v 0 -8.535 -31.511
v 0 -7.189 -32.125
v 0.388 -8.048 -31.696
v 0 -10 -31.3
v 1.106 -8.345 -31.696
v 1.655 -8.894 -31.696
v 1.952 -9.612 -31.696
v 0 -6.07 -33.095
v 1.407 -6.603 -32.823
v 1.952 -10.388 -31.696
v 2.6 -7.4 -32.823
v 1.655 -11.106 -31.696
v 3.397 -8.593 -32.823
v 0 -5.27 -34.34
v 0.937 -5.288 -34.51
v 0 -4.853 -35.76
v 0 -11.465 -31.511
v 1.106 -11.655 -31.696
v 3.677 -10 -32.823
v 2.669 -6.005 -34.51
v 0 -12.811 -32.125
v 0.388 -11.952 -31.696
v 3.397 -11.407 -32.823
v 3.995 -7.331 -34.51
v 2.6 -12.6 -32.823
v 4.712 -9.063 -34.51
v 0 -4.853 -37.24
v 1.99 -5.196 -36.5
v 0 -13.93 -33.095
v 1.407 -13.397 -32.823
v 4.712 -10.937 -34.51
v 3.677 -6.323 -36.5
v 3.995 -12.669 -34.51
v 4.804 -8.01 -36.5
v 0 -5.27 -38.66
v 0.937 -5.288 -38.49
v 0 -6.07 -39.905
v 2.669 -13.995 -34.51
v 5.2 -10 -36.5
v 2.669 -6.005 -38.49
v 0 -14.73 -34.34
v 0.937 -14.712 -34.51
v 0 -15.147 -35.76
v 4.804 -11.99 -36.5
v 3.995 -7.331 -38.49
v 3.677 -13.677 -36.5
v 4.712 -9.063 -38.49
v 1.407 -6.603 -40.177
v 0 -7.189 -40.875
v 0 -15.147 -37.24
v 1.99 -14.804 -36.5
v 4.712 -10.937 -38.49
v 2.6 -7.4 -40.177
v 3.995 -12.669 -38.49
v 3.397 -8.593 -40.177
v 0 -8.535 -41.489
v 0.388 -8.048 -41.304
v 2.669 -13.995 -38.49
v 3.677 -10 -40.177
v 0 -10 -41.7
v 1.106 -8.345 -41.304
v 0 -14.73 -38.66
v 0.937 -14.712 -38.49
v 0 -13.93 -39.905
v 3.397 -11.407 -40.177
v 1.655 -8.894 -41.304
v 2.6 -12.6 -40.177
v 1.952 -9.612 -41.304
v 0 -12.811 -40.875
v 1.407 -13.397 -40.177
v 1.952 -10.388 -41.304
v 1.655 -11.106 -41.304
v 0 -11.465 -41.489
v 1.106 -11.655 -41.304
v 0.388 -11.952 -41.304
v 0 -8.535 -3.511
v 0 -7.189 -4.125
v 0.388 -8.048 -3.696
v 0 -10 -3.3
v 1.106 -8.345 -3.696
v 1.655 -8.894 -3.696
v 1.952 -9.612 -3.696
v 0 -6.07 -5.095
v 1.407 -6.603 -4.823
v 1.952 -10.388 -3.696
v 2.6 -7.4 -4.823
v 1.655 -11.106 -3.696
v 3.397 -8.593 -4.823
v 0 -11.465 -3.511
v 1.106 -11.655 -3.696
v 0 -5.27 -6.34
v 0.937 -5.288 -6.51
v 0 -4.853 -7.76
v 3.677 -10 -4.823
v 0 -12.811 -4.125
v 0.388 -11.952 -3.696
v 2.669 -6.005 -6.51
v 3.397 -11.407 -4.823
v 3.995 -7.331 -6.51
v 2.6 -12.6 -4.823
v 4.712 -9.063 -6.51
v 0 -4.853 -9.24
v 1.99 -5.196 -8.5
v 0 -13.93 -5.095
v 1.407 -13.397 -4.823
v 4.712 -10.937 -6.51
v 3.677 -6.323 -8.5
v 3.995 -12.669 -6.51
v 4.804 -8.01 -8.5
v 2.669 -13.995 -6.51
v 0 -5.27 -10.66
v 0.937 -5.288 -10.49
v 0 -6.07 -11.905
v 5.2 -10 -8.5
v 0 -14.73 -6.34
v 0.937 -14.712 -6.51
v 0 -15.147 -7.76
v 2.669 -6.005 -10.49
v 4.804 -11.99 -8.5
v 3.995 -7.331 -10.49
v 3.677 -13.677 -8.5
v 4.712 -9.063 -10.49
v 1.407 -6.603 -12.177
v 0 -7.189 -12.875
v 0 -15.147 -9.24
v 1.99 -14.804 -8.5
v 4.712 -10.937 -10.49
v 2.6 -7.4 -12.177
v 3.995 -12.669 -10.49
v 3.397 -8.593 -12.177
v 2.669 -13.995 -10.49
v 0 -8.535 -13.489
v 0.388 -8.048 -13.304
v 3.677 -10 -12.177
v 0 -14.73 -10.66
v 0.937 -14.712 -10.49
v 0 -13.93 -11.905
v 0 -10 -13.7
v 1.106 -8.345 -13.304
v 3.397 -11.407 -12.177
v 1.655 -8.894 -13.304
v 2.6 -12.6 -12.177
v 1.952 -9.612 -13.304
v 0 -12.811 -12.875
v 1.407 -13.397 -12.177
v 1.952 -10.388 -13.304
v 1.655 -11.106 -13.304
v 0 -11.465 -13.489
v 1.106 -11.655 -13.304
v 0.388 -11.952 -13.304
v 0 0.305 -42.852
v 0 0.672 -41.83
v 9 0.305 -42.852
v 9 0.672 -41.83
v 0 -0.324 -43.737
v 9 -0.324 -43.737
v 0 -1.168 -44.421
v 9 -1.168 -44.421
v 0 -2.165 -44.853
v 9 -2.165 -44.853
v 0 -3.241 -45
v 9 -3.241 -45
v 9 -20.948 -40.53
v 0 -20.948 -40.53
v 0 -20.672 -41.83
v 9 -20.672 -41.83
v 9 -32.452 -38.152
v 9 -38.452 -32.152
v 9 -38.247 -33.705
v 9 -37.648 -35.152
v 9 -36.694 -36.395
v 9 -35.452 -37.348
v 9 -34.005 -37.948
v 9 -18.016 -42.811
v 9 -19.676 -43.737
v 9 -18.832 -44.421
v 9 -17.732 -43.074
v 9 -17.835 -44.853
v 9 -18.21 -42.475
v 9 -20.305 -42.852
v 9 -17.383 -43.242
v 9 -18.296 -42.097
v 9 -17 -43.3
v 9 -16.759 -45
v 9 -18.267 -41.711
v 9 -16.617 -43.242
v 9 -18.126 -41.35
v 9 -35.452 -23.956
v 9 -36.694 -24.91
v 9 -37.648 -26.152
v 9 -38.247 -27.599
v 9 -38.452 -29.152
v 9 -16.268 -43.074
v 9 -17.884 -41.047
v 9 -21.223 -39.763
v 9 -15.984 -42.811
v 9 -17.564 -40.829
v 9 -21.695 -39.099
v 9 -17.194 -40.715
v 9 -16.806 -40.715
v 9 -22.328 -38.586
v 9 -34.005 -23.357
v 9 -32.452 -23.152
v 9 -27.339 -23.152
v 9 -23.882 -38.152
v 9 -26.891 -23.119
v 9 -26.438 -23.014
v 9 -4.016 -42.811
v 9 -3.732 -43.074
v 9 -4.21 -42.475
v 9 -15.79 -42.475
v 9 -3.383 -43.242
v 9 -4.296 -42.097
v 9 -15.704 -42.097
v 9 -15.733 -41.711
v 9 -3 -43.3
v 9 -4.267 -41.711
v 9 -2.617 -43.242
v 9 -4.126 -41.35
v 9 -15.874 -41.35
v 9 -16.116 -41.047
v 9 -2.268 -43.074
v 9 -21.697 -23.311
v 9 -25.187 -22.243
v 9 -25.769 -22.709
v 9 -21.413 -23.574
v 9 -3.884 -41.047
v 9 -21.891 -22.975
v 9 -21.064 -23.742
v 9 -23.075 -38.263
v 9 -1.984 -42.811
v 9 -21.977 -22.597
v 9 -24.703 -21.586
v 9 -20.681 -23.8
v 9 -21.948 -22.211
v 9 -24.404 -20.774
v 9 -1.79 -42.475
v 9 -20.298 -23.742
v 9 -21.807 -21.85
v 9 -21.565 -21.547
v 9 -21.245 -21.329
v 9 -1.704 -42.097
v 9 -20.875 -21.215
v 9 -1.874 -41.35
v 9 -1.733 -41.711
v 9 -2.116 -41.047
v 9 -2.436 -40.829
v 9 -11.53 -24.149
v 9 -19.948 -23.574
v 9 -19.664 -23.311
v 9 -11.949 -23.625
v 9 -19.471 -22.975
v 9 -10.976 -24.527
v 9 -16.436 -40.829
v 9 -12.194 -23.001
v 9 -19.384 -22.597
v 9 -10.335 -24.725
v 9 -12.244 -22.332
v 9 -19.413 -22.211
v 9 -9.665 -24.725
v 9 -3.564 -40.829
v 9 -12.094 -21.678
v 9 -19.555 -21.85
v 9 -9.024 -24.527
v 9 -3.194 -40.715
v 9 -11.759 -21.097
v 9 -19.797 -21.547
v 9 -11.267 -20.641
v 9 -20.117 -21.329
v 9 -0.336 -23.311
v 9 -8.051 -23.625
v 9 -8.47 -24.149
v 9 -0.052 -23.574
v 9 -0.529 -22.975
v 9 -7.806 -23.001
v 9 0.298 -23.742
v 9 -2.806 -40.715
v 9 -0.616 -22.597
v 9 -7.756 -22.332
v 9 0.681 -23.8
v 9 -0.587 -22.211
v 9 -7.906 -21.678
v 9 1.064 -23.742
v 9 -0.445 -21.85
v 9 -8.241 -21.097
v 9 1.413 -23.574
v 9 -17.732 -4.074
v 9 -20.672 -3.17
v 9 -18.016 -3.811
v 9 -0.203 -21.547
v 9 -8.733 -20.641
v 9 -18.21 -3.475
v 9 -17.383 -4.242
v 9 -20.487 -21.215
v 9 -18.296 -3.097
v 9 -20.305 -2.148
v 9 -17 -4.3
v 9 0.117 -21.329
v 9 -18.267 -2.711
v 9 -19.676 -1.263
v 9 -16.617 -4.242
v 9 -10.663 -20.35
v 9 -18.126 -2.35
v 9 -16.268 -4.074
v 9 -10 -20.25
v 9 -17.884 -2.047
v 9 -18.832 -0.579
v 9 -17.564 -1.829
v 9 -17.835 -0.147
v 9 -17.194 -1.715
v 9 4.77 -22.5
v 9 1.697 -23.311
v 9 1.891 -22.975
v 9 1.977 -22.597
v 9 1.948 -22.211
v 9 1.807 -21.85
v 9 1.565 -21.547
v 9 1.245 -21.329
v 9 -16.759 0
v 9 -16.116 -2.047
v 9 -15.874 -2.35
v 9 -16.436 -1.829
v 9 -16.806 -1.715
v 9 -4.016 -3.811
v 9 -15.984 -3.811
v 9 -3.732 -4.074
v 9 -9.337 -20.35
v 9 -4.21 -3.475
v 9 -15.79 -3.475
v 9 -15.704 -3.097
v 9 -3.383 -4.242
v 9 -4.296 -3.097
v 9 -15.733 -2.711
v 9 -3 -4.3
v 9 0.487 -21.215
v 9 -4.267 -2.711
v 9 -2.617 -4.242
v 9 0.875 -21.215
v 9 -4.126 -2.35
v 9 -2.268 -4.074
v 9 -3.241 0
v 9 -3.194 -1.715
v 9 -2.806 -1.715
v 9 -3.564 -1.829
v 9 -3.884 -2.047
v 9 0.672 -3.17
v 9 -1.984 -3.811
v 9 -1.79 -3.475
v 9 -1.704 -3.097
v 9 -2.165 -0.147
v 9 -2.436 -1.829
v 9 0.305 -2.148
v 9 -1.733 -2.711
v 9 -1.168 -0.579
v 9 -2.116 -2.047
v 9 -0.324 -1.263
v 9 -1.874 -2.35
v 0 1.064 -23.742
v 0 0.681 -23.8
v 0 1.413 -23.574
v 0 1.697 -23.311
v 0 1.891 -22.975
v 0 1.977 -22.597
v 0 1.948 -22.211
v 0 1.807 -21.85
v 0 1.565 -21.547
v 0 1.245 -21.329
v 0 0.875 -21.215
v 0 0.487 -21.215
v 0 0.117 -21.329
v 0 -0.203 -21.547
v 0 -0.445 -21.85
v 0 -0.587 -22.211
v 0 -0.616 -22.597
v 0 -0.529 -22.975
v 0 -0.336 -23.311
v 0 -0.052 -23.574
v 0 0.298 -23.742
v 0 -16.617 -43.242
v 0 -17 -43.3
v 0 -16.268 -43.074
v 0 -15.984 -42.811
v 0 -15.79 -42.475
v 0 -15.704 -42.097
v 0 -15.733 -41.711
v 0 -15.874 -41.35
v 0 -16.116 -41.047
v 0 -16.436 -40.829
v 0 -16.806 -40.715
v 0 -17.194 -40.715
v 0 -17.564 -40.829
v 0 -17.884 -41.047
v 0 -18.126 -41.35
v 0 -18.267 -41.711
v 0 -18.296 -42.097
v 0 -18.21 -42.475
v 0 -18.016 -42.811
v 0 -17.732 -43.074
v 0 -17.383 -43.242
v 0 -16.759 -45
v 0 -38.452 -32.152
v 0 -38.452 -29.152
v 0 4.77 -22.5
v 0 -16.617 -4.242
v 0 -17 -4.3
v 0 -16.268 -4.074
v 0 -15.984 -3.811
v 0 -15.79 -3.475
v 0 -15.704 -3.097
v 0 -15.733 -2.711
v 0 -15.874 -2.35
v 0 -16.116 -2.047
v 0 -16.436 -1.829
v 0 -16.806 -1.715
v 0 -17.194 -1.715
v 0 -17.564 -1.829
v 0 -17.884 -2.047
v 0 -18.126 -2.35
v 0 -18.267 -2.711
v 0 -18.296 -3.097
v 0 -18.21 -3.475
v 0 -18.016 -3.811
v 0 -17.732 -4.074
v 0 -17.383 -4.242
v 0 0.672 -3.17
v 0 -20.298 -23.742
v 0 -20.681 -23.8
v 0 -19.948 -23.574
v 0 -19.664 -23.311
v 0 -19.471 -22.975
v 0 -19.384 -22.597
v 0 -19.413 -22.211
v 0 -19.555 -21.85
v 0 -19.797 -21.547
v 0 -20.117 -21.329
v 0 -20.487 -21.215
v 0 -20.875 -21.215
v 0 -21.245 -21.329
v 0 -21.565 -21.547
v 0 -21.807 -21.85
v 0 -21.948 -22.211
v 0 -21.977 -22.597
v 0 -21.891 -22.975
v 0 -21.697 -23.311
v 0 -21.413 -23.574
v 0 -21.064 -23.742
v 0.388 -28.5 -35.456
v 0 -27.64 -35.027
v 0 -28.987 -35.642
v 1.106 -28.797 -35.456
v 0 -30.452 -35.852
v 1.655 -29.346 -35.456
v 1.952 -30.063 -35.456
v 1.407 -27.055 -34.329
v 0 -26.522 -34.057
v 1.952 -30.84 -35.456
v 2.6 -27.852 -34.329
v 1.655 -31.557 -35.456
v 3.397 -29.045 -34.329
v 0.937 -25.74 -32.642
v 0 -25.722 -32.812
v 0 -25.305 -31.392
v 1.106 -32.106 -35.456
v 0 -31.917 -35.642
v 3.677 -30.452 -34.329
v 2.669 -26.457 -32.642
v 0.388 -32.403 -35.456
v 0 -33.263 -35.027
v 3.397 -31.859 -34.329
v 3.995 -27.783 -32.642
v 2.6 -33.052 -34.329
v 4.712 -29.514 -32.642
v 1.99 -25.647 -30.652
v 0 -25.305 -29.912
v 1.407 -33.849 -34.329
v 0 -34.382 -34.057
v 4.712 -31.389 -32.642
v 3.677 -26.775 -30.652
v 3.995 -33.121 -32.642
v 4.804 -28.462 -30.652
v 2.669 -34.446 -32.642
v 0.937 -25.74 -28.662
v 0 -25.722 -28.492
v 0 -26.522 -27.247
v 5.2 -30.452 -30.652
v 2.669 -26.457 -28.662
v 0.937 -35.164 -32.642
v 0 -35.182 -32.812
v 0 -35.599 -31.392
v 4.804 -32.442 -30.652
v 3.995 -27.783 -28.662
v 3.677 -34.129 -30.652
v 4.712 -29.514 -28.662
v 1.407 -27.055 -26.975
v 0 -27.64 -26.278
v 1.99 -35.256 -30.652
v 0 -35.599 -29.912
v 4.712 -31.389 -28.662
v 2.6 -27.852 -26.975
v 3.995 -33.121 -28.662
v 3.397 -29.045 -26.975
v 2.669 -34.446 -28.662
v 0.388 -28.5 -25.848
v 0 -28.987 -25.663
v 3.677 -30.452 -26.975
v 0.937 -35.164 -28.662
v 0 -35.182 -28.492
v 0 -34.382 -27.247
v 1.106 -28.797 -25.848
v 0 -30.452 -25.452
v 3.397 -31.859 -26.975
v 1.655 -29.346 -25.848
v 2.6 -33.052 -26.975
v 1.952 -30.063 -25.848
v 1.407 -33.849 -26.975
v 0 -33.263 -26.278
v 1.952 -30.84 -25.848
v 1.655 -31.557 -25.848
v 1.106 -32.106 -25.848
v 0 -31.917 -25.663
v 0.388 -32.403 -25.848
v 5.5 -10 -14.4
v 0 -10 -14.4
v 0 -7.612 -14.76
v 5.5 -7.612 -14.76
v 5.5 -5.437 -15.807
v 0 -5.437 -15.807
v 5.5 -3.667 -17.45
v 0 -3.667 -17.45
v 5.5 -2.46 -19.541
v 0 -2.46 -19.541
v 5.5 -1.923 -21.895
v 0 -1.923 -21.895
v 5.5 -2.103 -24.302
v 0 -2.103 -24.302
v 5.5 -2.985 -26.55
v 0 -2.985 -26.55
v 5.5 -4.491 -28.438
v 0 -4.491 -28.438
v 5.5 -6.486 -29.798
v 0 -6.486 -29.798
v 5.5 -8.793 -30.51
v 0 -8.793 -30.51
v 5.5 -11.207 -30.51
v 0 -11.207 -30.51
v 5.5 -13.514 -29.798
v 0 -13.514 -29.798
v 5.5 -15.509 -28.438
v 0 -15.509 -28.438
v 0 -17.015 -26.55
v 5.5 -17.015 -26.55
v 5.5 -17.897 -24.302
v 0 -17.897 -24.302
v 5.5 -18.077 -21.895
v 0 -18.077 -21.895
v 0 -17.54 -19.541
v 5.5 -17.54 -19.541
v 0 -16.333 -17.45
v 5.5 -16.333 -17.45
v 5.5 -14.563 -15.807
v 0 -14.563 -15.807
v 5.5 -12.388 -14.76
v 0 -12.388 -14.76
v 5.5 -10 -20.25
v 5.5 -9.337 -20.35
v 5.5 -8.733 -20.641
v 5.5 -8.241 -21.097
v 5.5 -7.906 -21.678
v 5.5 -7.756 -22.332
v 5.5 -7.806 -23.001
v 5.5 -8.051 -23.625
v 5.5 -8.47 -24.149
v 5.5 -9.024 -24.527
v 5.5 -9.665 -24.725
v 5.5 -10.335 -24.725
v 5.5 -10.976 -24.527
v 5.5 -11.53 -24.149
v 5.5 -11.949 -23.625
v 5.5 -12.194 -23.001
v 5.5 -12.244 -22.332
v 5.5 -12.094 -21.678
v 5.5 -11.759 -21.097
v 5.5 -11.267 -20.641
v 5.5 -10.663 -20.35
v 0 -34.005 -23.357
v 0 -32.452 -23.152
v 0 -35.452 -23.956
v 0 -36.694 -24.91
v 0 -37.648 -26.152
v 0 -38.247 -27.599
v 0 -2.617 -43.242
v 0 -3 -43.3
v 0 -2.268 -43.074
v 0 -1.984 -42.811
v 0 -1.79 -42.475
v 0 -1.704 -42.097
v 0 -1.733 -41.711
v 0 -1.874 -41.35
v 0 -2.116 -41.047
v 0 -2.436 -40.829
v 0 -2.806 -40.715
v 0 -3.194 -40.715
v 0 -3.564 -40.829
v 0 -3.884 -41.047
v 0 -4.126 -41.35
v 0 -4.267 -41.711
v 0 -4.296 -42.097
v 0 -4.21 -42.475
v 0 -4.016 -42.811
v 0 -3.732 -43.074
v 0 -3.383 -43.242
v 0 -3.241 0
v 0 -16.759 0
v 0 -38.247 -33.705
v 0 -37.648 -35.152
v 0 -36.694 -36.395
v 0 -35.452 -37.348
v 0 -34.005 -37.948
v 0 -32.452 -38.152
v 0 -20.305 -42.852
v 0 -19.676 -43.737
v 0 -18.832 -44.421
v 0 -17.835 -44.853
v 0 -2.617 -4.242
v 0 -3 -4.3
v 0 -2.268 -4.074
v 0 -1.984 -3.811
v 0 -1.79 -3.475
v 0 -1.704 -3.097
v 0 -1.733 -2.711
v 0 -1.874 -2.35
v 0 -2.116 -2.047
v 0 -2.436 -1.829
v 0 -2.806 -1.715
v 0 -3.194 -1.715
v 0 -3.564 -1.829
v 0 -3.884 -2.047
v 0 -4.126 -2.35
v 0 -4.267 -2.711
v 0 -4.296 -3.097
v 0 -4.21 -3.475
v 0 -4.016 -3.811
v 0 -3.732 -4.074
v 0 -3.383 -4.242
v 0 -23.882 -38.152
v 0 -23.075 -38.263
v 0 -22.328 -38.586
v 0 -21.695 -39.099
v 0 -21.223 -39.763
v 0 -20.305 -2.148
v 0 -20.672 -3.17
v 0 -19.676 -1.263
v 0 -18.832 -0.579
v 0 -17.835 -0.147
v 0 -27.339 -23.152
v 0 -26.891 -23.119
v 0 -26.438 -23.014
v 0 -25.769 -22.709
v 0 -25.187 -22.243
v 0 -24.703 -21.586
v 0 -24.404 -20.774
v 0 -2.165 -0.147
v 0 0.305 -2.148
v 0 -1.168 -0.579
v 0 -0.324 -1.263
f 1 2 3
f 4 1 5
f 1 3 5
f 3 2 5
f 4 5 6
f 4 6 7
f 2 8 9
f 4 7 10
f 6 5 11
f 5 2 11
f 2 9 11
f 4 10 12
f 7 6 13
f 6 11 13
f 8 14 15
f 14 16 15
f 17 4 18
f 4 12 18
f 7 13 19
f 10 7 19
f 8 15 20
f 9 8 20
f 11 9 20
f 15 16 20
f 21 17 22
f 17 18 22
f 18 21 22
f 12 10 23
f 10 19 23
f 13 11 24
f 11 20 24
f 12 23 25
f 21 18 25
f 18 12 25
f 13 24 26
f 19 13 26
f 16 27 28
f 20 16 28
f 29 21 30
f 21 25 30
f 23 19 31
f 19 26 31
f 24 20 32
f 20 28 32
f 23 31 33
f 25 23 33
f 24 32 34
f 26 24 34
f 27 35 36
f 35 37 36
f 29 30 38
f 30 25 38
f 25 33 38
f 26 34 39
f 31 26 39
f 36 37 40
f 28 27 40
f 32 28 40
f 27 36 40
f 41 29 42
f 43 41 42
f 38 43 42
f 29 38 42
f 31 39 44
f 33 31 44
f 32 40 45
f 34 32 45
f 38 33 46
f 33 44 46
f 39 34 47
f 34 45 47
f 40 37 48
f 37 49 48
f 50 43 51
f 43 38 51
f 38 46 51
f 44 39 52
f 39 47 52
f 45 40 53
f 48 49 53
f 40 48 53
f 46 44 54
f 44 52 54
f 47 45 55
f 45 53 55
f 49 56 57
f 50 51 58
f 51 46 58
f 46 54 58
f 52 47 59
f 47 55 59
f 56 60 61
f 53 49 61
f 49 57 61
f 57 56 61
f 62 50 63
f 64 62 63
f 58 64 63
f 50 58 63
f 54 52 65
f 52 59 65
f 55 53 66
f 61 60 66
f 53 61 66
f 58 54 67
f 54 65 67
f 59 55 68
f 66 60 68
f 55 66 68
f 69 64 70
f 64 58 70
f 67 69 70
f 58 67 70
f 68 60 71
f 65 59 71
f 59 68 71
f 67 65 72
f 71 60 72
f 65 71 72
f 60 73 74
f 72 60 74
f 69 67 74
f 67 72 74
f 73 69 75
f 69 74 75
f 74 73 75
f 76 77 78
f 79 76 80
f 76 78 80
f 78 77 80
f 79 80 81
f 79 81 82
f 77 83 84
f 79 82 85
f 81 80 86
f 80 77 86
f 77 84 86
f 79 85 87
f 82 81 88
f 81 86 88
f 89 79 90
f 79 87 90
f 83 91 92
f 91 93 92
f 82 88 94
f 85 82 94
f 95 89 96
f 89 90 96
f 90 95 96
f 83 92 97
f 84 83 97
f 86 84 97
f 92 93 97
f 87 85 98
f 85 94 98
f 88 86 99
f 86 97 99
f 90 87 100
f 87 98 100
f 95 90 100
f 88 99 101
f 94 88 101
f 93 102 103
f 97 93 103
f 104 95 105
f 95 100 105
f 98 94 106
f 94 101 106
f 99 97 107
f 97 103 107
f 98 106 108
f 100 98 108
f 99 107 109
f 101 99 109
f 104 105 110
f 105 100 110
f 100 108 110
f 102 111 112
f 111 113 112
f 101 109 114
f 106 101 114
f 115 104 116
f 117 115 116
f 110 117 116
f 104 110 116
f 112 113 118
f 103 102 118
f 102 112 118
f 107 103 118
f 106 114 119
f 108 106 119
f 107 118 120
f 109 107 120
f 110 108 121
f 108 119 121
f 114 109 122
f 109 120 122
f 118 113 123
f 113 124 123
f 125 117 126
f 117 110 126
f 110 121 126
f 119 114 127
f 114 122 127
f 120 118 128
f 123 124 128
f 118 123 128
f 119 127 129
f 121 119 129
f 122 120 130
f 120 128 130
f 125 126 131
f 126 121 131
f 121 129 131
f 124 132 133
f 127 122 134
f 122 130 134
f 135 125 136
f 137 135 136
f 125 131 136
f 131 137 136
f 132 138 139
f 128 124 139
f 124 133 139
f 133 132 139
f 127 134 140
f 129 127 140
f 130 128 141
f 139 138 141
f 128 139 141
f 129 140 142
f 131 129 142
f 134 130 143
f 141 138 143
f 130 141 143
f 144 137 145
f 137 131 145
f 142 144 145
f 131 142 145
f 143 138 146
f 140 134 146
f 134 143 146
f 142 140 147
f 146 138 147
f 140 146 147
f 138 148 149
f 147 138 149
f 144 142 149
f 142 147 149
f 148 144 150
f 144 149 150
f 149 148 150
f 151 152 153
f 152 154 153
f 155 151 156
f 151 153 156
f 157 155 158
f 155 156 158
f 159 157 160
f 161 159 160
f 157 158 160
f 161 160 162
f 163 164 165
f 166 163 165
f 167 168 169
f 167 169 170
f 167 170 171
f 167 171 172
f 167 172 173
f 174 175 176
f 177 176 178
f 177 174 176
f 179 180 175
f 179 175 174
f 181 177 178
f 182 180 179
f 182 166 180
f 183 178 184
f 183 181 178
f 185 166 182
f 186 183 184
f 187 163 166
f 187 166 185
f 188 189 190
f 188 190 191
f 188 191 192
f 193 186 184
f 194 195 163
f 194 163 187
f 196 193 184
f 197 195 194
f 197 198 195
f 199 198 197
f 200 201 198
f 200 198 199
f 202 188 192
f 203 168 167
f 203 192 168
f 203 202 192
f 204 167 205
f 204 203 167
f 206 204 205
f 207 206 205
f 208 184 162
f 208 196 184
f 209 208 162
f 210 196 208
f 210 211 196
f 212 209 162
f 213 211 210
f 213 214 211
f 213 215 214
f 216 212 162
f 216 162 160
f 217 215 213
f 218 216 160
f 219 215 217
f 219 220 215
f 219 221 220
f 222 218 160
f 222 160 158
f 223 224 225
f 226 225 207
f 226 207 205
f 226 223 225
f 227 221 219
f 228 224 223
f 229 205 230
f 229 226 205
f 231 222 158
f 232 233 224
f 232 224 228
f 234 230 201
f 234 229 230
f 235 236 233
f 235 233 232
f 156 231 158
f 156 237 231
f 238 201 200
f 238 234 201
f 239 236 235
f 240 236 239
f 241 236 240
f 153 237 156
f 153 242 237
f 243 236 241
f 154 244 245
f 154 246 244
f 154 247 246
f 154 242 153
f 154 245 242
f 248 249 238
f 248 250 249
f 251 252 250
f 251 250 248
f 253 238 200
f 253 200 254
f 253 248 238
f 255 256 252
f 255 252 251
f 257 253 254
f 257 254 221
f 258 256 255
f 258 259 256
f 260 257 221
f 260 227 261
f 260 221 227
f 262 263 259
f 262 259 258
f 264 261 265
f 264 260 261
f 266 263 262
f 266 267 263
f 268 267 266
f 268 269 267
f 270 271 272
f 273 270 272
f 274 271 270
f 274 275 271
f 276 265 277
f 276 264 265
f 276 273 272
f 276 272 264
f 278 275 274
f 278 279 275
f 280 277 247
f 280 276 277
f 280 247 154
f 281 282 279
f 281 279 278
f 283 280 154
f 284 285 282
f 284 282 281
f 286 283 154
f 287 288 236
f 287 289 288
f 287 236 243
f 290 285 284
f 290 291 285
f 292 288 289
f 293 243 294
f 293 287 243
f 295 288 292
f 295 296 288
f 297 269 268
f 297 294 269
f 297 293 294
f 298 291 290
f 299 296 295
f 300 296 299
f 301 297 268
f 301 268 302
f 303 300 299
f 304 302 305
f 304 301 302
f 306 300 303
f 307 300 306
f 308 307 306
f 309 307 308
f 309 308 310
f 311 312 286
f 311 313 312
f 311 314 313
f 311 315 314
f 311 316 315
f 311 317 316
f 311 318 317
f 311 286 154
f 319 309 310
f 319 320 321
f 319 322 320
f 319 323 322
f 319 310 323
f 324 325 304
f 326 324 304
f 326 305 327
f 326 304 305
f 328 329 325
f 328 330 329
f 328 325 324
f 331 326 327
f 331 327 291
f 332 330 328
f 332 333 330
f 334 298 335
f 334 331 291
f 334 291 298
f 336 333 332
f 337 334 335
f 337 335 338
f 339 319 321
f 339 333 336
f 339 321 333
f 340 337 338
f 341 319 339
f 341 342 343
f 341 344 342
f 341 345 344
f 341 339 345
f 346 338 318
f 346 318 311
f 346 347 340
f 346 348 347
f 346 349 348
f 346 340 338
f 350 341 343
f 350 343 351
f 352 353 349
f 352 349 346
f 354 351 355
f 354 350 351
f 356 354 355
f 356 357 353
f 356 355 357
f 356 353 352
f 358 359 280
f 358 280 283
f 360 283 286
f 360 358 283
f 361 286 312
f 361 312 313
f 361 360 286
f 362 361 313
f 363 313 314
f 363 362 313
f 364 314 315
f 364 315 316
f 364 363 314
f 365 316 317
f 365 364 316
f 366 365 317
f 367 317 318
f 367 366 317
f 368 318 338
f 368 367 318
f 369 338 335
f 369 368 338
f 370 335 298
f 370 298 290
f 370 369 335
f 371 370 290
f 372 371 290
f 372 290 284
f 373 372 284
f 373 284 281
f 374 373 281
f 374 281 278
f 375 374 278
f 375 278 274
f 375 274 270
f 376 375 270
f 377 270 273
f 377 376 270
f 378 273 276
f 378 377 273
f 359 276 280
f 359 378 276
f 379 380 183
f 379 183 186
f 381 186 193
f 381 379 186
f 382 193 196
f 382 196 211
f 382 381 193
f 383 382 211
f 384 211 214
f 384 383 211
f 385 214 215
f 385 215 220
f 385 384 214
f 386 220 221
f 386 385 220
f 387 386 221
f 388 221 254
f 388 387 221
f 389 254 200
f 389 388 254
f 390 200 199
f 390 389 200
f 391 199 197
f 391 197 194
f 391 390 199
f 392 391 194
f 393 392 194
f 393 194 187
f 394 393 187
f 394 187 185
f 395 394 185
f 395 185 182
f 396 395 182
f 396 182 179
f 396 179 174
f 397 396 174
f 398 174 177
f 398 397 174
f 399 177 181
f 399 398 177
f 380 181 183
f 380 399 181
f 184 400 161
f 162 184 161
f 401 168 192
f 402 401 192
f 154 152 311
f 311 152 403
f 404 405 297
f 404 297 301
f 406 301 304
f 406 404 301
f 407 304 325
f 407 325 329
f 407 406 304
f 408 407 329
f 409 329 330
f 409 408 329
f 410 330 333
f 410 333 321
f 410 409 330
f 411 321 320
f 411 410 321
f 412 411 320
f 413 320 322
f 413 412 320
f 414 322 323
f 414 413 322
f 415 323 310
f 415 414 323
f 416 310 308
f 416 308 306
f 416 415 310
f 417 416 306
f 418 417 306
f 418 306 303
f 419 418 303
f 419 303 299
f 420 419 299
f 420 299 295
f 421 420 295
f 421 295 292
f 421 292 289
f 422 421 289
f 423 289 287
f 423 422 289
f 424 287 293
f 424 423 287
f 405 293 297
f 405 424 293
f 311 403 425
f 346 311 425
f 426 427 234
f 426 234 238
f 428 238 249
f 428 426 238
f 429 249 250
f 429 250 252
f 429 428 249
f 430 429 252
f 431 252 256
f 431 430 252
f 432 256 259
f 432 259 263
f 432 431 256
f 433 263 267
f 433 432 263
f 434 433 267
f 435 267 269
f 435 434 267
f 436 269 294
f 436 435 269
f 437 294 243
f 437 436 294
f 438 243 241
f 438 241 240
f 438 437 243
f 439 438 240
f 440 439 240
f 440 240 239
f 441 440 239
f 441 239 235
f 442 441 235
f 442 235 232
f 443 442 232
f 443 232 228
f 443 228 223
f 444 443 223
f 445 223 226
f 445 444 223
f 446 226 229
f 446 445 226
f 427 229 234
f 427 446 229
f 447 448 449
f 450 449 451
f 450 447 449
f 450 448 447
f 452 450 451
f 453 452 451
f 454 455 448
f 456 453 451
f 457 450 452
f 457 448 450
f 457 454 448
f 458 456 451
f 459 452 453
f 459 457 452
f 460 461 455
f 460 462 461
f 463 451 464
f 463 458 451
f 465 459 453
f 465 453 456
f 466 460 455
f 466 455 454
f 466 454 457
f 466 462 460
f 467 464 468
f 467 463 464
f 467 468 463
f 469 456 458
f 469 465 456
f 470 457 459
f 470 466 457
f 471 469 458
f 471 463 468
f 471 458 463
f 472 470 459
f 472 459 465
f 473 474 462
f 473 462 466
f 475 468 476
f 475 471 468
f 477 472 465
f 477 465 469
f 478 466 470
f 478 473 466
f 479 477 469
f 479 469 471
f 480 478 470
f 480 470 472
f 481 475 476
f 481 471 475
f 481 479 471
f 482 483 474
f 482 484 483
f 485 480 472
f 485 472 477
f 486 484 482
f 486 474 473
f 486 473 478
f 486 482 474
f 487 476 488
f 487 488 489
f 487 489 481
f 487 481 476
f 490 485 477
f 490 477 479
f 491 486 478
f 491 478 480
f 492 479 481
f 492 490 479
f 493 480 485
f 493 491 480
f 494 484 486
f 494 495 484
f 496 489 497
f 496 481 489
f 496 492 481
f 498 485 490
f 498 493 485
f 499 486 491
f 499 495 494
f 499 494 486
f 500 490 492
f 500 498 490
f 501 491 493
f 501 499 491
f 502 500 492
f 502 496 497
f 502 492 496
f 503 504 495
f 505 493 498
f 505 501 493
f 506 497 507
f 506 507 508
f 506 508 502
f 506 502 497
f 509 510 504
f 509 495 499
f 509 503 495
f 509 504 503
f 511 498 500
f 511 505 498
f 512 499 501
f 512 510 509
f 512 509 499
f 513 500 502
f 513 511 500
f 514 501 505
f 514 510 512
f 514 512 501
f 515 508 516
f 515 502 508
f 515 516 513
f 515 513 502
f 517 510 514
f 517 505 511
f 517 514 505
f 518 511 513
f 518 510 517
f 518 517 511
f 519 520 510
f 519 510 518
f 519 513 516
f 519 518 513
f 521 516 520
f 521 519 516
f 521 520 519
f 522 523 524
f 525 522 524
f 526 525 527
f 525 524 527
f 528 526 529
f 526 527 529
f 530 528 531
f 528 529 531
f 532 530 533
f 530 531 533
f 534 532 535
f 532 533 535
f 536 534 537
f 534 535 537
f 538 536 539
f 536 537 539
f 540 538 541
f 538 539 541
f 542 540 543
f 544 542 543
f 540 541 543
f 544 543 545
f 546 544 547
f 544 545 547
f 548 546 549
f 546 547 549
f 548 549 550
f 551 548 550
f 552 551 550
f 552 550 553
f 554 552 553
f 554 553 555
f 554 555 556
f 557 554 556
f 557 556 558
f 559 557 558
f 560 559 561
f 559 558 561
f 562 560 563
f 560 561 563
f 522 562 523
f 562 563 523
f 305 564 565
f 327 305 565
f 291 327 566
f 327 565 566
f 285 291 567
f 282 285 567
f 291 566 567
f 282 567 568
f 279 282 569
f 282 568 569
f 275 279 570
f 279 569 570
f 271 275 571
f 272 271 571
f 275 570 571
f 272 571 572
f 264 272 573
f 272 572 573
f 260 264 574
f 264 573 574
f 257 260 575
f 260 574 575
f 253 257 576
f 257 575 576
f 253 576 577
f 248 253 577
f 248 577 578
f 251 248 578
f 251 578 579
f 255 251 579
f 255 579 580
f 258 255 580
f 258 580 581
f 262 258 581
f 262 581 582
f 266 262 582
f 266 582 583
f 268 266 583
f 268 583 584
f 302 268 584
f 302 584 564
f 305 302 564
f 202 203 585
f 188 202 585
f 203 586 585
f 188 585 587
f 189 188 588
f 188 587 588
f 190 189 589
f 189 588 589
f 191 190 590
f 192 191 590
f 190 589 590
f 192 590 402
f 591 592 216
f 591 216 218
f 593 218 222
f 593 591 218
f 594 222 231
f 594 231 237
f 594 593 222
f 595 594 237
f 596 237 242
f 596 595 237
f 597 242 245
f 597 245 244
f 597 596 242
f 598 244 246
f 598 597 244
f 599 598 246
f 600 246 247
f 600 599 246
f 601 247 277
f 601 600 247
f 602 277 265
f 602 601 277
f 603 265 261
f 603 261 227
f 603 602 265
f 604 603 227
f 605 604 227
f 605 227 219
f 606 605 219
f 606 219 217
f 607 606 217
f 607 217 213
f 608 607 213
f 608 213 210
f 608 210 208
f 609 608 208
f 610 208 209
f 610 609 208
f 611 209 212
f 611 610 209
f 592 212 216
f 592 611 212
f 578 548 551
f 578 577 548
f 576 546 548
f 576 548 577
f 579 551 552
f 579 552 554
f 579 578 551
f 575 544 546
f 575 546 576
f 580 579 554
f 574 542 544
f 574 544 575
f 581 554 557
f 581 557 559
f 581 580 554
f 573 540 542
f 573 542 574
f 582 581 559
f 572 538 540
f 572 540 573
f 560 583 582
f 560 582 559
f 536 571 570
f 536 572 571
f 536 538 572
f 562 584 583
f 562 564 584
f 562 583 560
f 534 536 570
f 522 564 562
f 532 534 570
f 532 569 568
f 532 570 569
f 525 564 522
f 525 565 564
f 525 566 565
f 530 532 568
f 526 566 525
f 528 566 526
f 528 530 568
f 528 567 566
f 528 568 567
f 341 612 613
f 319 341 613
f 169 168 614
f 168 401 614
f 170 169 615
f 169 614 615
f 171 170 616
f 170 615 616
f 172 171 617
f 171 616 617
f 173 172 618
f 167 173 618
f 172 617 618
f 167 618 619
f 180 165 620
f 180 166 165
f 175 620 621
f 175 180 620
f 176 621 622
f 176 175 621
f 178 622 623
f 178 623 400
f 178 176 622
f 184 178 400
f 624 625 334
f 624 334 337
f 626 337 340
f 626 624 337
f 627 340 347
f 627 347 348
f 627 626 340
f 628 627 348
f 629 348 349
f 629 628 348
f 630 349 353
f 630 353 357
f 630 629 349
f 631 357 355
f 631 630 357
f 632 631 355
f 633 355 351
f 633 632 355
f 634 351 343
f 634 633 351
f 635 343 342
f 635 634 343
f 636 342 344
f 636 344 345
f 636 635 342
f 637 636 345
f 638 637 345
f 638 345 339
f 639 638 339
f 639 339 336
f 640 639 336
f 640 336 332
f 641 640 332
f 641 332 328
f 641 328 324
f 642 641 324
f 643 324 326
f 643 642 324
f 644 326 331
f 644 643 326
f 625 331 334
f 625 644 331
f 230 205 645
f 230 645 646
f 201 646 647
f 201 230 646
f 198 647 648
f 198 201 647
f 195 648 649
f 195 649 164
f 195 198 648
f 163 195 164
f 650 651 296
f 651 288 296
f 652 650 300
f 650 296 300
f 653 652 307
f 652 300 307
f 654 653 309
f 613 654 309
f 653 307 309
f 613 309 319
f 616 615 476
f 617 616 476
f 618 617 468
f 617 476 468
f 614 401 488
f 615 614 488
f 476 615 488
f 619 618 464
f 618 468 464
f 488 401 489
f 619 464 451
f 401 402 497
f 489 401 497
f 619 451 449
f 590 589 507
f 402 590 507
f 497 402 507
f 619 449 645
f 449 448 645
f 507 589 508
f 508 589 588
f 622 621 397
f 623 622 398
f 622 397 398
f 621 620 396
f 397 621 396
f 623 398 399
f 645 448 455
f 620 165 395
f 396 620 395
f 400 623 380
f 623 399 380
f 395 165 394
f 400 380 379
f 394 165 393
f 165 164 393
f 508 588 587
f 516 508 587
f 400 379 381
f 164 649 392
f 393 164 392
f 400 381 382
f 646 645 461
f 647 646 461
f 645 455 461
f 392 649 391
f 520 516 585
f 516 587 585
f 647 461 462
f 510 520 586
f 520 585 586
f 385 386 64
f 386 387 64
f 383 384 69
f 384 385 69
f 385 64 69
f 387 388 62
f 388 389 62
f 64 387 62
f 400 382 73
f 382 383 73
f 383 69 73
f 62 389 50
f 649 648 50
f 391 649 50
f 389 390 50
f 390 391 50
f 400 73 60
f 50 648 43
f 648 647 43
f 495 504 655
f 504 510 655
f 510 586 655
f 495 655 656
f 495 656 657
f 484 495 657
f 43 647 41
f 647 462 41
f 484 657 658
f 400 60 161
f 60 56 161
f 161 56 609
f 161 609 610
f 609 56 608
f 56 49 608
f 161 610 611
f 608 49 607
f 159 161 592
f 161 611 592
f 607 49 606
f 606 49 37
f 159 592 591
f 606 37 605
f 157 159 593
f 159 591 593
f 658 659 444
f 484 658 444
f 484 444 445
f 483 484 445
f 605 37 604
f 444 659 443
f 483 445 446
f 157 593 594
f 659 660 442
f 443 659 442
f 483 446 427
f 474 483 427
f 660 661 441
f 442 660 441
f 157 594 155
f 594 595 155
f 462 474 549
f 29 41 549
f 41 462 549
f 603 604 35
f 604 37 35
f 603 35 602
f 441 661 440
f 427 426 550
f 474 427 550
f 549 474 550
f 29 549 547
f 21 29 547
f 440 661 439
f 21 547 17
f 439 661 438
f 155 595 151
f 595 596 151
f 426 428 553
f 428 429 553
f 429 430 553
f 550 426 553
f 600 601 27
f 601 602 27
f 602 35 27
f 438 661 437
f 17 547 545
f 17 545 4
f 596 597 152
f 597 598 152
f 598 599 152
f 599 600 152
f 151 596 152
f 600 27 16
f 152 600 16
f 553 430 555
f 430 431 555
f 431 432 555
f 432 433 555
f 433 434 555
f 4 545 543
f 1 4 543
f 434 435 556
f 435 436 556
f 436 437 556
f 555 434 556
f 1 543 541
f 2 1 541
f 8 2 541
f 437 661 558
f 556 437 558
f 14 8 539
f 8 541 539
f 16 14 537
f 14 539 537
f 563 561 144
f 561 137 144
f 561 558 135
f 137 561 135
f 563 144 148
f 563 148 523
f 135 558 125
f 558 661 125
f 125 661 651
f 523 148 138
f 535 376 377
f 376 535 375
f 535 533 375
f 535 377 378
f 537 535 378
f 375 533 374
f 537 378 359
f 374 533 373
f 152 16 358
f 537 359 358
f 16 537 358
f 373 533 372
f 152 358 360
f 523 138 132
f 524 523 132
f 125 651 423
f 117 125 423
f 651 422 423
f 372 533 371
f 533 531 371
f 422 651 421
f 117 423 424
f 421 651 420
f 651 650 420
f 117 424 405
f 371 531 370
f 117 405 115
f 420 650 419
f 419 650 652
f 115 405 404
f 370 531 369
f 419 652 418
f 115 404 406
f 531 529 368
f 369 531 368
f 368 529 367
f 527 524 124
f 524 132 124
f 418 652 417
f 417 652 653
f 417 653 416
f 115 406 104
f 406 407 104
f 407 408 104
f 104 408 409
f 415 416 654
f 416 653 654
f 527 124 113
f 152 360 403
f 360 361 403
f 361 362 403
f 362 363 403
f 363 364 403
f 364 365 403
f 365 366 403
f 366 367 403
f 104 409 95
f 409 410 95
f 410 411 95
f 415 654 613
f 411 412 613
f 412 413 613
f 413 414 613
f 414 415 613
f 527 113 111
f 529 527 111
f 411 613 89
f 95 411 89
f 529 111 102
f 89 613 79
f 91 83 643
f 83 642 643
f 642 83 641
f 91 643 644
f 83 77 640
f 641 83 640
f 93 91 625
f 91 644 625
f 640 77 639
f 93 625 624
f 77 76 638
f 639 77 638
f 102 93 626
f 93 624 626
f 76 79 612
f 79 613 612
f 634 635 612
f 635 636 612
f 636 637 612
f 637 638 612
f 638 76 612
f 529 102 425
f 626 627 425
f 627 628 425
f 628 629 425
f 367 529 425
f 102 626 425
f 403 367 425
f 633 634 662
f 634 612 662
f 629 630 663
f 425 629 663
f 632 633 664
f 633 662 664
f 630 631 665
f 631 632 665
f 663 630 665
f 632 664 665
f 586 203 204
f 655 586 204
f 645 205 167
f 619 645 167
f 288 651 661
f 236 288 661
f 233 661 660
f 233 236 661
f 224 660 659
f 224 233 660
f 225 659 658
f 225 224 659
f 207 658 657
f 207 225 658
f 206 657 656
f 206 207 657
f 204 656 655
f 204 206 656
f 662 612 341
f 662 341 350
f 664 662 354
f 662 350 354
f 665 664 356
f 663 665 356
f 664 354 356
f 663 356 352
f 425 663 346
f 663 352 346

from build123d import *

# Parameters (mm, degrees)
SKETCH1_R           = 1.3
BOSS_EXTRUDE1_DEPTH = 9
CUT_REVOLVE3_ANGLE  = 180
SKETCH8_R           = 8.1
CUT_EXTRUDE4_DEPTH  = 5.5
SKETCH9_R           = 2.25
CUT_EXTRUDE5_DEPTH  = 52.660312042
BOSS_EXTRUDE7_DEPTH = 9
CUT_REVOLVE4_ANGLE  = 180
FILLET1_R           = 6
FILLET2_R           = 4
FILLET3_R           = 3
FILLET4_R           = 3


with BuildPart() as part:
    # Sketch1 → Boss-Extrude1 (new body)
    with BuildSketch(Plane(origin=(0, 0, 0), x_dir=(0, 0, -1), z_dir=(1, 0, 0))):
        Polygon((0, -20), (22.5, -24.769696007), (45, -20), (45, 0), (22.5, 4.769696007), (0, 0), align=None)
        with Locations((22.5, -20.680807118)):
            Circle(SKETCH1_R, mode=Mode.SUBTRACT)
        with Locations((22.5, 0.680807118)):
            Circle(SKETCH1_R, mode=Mode.SUBTRACT)
        with Locations((42, -17)):
            Circle(SKETCH1_R, mode=Mode.SUBTRACT)
        with Locations((3, -17)):
            Circle(SKETCH1_R, mode=Mode.SUBTRACT)
        with Locations((3, -3)):
            Circle(SKETCH1_R, mode=Mode.SUBTRACT)
        with Locations((42, -3)):
            Circle(SKETCH1_R, mode=Mode.SUBTRACT)
    extrude(amount=BOSS_EXTRUDE1_DEPTH)

    # Sketch7 → Cut-Revolve3 (revolve, cut)
    with BuildSketch(Plane.ZY):
        with BuildLine():
            Line((-41.7, -10), (-31.3, -10))
            ThreePointArc((-31.3, -10), (-36.5, -4.8), (-41.7, -10))
        make_face()
        with BuildLine():
            Line((-13.7, -10), (-3.3, -10))
            ThreePointArc((-3.3, -10), (-8.5, -4.8), (-13.7, -10))
        make_face()
    revolve(axis=Axis((0, -10, -41.7), (0, 0, -1)), revolution_arc=CUT_REVOLVE3_ANGLE, mode=Mode.SUBTRACT)

    # Sketch8 → Cut-Extrude4 (cut)
    with BuildSketch(Plane.ZY):
        with Locations((-22.5, -10)):
            Circle(SKETCH8_R)
    extrude(amount=-CUT_EXTRUDE4_DEPTH, mode=Mode.SUBTRACT)

    # Sketch9 → Cut-Extrude5 (cut, through all)
    with BuildSketch(Plane.ZY.offset(-5.5)):
        with Locations((-22.5, -10)):
            Circle(SKETCH9_R)
    extrude(amount=-CUT_EXTRUDE5_DEPTH, mode=Mode.SUBTRACT)

    # Sketch16 → Boss-Extrude7 (add)
    with BuildSketch(Plane(origin=(9, 0, 0), x_dir=(0, 0, -1), z_dir=(1, 0, 0))):
        Polygon((38.152173913, -21.451646611), (38.152173913, -38.451646611), (23.152173913, -38.451646611), (23.152173913, -24.631443949), align=None)
    extrude(amount=-BOSS_EXTRUDE7_DEPTH)

    # Sketch17 → Cut-Revolve4 (revolve, cut)
    with BuildSketch(Plane.ZY):
        with BuildLine():
            Line((-25.452173913, -30.451646611), (-35.852173913, -30.451646611))
            ThreePointArc((-35.852173913, -30.451646611), (-30.652173913, -25.251646611), (-25.452173913, -30.451646611))
        make_face()
    revolve(axis=Axis((0, -30.451646611, -25.452173913), (0, 0, -1)), revolution_arc=CUT_REVOLVE4_ANGLE, mode=Mode.SUBTRACT)

    # Fillet1
    fillet1_edges = [part.edges().sort_by_distance(p)[0] for p in [
        (4.5, -38.451646611, -38.152173913),
        (4.5, -38.451646611, -23.152173913),
    ]]
    fillet(fillet1_edges, radius=FILLET1_R)

    # Fillet2
    fillet2_edges = [part.edges().sort_by_distance(p)[0] for p in [
        (4.5, -20, -45),
        (4.5, -20, 0),
        (4.5, 0, 0),
        (4.5, 0, -45),
    ]]
    fillet(fillet2_edges, radius=FILLET2_R)

    # Fillet3
    # the kernel refuses this fillet: 3 mm, written as the material it adds along each edge
    with BuildSketch(Plane(origin=(9, -24.631443949, -23.152173913), x_dir=(0, -0.20737808726534282, 0.9782608695650501), z_dir=(-1, 0, 0))) as fillet3_piece_1:
        with BuildLine():
            CenterArc((3.350740319, -1.340055458), FILLET3_R, 153.468795145, 38.499950409)
            Line((0.41595771, -1.96218972), (0.357262058, -1.974632405))
            Line((0.357262058, -1.974632405), (-0.058695652, -0.012442685))
            Line((-0.058695652, -0.012442685), (0, 0.06))
            ThreePointArc((0, 0.06), (0.333333333, 0.06), (0.612985194, 0.026801109))
            Line((0.612985194, 0.026801109), (0.666666667, 0))
        make_face()
    extrude(amount=9)
    with BuildSketch(Plane(origin=(9, -21.451646611, -38.152173913), x_dir=(0, -1, 0), z_dir=(-1, 0, 0))) as fillet3_piece_2:
        with BuildLine():
            CenterArc((FILLET3_R * 0.810235733018, -FILLET3_R), FILLET3_R, 90, 78.031254445)
            Line((-FILLET3_R * 0.168025136547, -FILLET3_R * 0.792621912735), (-FILLET3_R * 0.187590353938, -FILLET3_R * 0.78847435099))
            Line((-FILLET3_R * 0.187590353938, -FILLET3_R * 0.78847435099), (-FILLET3_R * 0.0162047146604, FILLET3_R * 0.02))
            Line((-FILLET3_R * 0.0162047146604, FILLET3_R * 0.02), (FILLET3_R * 0.810235733018, FILLET3_R * 0.02))
            Line((FILLET3_R * 0.810235733018, FILLET3_R * 0.02), (FILLET3_R * 0.810235733018, 0))
        make_face()
    extrude(amount=9)

    # Fillet4
    fillet4_edges = [part.edges().sort_by_distance(p)[0] for p in [
        (4.5, -24.769696007, -22.5),
    ]]
    fillet(fillet4_edges, radius=FILLET4_R)


solid = part.part
